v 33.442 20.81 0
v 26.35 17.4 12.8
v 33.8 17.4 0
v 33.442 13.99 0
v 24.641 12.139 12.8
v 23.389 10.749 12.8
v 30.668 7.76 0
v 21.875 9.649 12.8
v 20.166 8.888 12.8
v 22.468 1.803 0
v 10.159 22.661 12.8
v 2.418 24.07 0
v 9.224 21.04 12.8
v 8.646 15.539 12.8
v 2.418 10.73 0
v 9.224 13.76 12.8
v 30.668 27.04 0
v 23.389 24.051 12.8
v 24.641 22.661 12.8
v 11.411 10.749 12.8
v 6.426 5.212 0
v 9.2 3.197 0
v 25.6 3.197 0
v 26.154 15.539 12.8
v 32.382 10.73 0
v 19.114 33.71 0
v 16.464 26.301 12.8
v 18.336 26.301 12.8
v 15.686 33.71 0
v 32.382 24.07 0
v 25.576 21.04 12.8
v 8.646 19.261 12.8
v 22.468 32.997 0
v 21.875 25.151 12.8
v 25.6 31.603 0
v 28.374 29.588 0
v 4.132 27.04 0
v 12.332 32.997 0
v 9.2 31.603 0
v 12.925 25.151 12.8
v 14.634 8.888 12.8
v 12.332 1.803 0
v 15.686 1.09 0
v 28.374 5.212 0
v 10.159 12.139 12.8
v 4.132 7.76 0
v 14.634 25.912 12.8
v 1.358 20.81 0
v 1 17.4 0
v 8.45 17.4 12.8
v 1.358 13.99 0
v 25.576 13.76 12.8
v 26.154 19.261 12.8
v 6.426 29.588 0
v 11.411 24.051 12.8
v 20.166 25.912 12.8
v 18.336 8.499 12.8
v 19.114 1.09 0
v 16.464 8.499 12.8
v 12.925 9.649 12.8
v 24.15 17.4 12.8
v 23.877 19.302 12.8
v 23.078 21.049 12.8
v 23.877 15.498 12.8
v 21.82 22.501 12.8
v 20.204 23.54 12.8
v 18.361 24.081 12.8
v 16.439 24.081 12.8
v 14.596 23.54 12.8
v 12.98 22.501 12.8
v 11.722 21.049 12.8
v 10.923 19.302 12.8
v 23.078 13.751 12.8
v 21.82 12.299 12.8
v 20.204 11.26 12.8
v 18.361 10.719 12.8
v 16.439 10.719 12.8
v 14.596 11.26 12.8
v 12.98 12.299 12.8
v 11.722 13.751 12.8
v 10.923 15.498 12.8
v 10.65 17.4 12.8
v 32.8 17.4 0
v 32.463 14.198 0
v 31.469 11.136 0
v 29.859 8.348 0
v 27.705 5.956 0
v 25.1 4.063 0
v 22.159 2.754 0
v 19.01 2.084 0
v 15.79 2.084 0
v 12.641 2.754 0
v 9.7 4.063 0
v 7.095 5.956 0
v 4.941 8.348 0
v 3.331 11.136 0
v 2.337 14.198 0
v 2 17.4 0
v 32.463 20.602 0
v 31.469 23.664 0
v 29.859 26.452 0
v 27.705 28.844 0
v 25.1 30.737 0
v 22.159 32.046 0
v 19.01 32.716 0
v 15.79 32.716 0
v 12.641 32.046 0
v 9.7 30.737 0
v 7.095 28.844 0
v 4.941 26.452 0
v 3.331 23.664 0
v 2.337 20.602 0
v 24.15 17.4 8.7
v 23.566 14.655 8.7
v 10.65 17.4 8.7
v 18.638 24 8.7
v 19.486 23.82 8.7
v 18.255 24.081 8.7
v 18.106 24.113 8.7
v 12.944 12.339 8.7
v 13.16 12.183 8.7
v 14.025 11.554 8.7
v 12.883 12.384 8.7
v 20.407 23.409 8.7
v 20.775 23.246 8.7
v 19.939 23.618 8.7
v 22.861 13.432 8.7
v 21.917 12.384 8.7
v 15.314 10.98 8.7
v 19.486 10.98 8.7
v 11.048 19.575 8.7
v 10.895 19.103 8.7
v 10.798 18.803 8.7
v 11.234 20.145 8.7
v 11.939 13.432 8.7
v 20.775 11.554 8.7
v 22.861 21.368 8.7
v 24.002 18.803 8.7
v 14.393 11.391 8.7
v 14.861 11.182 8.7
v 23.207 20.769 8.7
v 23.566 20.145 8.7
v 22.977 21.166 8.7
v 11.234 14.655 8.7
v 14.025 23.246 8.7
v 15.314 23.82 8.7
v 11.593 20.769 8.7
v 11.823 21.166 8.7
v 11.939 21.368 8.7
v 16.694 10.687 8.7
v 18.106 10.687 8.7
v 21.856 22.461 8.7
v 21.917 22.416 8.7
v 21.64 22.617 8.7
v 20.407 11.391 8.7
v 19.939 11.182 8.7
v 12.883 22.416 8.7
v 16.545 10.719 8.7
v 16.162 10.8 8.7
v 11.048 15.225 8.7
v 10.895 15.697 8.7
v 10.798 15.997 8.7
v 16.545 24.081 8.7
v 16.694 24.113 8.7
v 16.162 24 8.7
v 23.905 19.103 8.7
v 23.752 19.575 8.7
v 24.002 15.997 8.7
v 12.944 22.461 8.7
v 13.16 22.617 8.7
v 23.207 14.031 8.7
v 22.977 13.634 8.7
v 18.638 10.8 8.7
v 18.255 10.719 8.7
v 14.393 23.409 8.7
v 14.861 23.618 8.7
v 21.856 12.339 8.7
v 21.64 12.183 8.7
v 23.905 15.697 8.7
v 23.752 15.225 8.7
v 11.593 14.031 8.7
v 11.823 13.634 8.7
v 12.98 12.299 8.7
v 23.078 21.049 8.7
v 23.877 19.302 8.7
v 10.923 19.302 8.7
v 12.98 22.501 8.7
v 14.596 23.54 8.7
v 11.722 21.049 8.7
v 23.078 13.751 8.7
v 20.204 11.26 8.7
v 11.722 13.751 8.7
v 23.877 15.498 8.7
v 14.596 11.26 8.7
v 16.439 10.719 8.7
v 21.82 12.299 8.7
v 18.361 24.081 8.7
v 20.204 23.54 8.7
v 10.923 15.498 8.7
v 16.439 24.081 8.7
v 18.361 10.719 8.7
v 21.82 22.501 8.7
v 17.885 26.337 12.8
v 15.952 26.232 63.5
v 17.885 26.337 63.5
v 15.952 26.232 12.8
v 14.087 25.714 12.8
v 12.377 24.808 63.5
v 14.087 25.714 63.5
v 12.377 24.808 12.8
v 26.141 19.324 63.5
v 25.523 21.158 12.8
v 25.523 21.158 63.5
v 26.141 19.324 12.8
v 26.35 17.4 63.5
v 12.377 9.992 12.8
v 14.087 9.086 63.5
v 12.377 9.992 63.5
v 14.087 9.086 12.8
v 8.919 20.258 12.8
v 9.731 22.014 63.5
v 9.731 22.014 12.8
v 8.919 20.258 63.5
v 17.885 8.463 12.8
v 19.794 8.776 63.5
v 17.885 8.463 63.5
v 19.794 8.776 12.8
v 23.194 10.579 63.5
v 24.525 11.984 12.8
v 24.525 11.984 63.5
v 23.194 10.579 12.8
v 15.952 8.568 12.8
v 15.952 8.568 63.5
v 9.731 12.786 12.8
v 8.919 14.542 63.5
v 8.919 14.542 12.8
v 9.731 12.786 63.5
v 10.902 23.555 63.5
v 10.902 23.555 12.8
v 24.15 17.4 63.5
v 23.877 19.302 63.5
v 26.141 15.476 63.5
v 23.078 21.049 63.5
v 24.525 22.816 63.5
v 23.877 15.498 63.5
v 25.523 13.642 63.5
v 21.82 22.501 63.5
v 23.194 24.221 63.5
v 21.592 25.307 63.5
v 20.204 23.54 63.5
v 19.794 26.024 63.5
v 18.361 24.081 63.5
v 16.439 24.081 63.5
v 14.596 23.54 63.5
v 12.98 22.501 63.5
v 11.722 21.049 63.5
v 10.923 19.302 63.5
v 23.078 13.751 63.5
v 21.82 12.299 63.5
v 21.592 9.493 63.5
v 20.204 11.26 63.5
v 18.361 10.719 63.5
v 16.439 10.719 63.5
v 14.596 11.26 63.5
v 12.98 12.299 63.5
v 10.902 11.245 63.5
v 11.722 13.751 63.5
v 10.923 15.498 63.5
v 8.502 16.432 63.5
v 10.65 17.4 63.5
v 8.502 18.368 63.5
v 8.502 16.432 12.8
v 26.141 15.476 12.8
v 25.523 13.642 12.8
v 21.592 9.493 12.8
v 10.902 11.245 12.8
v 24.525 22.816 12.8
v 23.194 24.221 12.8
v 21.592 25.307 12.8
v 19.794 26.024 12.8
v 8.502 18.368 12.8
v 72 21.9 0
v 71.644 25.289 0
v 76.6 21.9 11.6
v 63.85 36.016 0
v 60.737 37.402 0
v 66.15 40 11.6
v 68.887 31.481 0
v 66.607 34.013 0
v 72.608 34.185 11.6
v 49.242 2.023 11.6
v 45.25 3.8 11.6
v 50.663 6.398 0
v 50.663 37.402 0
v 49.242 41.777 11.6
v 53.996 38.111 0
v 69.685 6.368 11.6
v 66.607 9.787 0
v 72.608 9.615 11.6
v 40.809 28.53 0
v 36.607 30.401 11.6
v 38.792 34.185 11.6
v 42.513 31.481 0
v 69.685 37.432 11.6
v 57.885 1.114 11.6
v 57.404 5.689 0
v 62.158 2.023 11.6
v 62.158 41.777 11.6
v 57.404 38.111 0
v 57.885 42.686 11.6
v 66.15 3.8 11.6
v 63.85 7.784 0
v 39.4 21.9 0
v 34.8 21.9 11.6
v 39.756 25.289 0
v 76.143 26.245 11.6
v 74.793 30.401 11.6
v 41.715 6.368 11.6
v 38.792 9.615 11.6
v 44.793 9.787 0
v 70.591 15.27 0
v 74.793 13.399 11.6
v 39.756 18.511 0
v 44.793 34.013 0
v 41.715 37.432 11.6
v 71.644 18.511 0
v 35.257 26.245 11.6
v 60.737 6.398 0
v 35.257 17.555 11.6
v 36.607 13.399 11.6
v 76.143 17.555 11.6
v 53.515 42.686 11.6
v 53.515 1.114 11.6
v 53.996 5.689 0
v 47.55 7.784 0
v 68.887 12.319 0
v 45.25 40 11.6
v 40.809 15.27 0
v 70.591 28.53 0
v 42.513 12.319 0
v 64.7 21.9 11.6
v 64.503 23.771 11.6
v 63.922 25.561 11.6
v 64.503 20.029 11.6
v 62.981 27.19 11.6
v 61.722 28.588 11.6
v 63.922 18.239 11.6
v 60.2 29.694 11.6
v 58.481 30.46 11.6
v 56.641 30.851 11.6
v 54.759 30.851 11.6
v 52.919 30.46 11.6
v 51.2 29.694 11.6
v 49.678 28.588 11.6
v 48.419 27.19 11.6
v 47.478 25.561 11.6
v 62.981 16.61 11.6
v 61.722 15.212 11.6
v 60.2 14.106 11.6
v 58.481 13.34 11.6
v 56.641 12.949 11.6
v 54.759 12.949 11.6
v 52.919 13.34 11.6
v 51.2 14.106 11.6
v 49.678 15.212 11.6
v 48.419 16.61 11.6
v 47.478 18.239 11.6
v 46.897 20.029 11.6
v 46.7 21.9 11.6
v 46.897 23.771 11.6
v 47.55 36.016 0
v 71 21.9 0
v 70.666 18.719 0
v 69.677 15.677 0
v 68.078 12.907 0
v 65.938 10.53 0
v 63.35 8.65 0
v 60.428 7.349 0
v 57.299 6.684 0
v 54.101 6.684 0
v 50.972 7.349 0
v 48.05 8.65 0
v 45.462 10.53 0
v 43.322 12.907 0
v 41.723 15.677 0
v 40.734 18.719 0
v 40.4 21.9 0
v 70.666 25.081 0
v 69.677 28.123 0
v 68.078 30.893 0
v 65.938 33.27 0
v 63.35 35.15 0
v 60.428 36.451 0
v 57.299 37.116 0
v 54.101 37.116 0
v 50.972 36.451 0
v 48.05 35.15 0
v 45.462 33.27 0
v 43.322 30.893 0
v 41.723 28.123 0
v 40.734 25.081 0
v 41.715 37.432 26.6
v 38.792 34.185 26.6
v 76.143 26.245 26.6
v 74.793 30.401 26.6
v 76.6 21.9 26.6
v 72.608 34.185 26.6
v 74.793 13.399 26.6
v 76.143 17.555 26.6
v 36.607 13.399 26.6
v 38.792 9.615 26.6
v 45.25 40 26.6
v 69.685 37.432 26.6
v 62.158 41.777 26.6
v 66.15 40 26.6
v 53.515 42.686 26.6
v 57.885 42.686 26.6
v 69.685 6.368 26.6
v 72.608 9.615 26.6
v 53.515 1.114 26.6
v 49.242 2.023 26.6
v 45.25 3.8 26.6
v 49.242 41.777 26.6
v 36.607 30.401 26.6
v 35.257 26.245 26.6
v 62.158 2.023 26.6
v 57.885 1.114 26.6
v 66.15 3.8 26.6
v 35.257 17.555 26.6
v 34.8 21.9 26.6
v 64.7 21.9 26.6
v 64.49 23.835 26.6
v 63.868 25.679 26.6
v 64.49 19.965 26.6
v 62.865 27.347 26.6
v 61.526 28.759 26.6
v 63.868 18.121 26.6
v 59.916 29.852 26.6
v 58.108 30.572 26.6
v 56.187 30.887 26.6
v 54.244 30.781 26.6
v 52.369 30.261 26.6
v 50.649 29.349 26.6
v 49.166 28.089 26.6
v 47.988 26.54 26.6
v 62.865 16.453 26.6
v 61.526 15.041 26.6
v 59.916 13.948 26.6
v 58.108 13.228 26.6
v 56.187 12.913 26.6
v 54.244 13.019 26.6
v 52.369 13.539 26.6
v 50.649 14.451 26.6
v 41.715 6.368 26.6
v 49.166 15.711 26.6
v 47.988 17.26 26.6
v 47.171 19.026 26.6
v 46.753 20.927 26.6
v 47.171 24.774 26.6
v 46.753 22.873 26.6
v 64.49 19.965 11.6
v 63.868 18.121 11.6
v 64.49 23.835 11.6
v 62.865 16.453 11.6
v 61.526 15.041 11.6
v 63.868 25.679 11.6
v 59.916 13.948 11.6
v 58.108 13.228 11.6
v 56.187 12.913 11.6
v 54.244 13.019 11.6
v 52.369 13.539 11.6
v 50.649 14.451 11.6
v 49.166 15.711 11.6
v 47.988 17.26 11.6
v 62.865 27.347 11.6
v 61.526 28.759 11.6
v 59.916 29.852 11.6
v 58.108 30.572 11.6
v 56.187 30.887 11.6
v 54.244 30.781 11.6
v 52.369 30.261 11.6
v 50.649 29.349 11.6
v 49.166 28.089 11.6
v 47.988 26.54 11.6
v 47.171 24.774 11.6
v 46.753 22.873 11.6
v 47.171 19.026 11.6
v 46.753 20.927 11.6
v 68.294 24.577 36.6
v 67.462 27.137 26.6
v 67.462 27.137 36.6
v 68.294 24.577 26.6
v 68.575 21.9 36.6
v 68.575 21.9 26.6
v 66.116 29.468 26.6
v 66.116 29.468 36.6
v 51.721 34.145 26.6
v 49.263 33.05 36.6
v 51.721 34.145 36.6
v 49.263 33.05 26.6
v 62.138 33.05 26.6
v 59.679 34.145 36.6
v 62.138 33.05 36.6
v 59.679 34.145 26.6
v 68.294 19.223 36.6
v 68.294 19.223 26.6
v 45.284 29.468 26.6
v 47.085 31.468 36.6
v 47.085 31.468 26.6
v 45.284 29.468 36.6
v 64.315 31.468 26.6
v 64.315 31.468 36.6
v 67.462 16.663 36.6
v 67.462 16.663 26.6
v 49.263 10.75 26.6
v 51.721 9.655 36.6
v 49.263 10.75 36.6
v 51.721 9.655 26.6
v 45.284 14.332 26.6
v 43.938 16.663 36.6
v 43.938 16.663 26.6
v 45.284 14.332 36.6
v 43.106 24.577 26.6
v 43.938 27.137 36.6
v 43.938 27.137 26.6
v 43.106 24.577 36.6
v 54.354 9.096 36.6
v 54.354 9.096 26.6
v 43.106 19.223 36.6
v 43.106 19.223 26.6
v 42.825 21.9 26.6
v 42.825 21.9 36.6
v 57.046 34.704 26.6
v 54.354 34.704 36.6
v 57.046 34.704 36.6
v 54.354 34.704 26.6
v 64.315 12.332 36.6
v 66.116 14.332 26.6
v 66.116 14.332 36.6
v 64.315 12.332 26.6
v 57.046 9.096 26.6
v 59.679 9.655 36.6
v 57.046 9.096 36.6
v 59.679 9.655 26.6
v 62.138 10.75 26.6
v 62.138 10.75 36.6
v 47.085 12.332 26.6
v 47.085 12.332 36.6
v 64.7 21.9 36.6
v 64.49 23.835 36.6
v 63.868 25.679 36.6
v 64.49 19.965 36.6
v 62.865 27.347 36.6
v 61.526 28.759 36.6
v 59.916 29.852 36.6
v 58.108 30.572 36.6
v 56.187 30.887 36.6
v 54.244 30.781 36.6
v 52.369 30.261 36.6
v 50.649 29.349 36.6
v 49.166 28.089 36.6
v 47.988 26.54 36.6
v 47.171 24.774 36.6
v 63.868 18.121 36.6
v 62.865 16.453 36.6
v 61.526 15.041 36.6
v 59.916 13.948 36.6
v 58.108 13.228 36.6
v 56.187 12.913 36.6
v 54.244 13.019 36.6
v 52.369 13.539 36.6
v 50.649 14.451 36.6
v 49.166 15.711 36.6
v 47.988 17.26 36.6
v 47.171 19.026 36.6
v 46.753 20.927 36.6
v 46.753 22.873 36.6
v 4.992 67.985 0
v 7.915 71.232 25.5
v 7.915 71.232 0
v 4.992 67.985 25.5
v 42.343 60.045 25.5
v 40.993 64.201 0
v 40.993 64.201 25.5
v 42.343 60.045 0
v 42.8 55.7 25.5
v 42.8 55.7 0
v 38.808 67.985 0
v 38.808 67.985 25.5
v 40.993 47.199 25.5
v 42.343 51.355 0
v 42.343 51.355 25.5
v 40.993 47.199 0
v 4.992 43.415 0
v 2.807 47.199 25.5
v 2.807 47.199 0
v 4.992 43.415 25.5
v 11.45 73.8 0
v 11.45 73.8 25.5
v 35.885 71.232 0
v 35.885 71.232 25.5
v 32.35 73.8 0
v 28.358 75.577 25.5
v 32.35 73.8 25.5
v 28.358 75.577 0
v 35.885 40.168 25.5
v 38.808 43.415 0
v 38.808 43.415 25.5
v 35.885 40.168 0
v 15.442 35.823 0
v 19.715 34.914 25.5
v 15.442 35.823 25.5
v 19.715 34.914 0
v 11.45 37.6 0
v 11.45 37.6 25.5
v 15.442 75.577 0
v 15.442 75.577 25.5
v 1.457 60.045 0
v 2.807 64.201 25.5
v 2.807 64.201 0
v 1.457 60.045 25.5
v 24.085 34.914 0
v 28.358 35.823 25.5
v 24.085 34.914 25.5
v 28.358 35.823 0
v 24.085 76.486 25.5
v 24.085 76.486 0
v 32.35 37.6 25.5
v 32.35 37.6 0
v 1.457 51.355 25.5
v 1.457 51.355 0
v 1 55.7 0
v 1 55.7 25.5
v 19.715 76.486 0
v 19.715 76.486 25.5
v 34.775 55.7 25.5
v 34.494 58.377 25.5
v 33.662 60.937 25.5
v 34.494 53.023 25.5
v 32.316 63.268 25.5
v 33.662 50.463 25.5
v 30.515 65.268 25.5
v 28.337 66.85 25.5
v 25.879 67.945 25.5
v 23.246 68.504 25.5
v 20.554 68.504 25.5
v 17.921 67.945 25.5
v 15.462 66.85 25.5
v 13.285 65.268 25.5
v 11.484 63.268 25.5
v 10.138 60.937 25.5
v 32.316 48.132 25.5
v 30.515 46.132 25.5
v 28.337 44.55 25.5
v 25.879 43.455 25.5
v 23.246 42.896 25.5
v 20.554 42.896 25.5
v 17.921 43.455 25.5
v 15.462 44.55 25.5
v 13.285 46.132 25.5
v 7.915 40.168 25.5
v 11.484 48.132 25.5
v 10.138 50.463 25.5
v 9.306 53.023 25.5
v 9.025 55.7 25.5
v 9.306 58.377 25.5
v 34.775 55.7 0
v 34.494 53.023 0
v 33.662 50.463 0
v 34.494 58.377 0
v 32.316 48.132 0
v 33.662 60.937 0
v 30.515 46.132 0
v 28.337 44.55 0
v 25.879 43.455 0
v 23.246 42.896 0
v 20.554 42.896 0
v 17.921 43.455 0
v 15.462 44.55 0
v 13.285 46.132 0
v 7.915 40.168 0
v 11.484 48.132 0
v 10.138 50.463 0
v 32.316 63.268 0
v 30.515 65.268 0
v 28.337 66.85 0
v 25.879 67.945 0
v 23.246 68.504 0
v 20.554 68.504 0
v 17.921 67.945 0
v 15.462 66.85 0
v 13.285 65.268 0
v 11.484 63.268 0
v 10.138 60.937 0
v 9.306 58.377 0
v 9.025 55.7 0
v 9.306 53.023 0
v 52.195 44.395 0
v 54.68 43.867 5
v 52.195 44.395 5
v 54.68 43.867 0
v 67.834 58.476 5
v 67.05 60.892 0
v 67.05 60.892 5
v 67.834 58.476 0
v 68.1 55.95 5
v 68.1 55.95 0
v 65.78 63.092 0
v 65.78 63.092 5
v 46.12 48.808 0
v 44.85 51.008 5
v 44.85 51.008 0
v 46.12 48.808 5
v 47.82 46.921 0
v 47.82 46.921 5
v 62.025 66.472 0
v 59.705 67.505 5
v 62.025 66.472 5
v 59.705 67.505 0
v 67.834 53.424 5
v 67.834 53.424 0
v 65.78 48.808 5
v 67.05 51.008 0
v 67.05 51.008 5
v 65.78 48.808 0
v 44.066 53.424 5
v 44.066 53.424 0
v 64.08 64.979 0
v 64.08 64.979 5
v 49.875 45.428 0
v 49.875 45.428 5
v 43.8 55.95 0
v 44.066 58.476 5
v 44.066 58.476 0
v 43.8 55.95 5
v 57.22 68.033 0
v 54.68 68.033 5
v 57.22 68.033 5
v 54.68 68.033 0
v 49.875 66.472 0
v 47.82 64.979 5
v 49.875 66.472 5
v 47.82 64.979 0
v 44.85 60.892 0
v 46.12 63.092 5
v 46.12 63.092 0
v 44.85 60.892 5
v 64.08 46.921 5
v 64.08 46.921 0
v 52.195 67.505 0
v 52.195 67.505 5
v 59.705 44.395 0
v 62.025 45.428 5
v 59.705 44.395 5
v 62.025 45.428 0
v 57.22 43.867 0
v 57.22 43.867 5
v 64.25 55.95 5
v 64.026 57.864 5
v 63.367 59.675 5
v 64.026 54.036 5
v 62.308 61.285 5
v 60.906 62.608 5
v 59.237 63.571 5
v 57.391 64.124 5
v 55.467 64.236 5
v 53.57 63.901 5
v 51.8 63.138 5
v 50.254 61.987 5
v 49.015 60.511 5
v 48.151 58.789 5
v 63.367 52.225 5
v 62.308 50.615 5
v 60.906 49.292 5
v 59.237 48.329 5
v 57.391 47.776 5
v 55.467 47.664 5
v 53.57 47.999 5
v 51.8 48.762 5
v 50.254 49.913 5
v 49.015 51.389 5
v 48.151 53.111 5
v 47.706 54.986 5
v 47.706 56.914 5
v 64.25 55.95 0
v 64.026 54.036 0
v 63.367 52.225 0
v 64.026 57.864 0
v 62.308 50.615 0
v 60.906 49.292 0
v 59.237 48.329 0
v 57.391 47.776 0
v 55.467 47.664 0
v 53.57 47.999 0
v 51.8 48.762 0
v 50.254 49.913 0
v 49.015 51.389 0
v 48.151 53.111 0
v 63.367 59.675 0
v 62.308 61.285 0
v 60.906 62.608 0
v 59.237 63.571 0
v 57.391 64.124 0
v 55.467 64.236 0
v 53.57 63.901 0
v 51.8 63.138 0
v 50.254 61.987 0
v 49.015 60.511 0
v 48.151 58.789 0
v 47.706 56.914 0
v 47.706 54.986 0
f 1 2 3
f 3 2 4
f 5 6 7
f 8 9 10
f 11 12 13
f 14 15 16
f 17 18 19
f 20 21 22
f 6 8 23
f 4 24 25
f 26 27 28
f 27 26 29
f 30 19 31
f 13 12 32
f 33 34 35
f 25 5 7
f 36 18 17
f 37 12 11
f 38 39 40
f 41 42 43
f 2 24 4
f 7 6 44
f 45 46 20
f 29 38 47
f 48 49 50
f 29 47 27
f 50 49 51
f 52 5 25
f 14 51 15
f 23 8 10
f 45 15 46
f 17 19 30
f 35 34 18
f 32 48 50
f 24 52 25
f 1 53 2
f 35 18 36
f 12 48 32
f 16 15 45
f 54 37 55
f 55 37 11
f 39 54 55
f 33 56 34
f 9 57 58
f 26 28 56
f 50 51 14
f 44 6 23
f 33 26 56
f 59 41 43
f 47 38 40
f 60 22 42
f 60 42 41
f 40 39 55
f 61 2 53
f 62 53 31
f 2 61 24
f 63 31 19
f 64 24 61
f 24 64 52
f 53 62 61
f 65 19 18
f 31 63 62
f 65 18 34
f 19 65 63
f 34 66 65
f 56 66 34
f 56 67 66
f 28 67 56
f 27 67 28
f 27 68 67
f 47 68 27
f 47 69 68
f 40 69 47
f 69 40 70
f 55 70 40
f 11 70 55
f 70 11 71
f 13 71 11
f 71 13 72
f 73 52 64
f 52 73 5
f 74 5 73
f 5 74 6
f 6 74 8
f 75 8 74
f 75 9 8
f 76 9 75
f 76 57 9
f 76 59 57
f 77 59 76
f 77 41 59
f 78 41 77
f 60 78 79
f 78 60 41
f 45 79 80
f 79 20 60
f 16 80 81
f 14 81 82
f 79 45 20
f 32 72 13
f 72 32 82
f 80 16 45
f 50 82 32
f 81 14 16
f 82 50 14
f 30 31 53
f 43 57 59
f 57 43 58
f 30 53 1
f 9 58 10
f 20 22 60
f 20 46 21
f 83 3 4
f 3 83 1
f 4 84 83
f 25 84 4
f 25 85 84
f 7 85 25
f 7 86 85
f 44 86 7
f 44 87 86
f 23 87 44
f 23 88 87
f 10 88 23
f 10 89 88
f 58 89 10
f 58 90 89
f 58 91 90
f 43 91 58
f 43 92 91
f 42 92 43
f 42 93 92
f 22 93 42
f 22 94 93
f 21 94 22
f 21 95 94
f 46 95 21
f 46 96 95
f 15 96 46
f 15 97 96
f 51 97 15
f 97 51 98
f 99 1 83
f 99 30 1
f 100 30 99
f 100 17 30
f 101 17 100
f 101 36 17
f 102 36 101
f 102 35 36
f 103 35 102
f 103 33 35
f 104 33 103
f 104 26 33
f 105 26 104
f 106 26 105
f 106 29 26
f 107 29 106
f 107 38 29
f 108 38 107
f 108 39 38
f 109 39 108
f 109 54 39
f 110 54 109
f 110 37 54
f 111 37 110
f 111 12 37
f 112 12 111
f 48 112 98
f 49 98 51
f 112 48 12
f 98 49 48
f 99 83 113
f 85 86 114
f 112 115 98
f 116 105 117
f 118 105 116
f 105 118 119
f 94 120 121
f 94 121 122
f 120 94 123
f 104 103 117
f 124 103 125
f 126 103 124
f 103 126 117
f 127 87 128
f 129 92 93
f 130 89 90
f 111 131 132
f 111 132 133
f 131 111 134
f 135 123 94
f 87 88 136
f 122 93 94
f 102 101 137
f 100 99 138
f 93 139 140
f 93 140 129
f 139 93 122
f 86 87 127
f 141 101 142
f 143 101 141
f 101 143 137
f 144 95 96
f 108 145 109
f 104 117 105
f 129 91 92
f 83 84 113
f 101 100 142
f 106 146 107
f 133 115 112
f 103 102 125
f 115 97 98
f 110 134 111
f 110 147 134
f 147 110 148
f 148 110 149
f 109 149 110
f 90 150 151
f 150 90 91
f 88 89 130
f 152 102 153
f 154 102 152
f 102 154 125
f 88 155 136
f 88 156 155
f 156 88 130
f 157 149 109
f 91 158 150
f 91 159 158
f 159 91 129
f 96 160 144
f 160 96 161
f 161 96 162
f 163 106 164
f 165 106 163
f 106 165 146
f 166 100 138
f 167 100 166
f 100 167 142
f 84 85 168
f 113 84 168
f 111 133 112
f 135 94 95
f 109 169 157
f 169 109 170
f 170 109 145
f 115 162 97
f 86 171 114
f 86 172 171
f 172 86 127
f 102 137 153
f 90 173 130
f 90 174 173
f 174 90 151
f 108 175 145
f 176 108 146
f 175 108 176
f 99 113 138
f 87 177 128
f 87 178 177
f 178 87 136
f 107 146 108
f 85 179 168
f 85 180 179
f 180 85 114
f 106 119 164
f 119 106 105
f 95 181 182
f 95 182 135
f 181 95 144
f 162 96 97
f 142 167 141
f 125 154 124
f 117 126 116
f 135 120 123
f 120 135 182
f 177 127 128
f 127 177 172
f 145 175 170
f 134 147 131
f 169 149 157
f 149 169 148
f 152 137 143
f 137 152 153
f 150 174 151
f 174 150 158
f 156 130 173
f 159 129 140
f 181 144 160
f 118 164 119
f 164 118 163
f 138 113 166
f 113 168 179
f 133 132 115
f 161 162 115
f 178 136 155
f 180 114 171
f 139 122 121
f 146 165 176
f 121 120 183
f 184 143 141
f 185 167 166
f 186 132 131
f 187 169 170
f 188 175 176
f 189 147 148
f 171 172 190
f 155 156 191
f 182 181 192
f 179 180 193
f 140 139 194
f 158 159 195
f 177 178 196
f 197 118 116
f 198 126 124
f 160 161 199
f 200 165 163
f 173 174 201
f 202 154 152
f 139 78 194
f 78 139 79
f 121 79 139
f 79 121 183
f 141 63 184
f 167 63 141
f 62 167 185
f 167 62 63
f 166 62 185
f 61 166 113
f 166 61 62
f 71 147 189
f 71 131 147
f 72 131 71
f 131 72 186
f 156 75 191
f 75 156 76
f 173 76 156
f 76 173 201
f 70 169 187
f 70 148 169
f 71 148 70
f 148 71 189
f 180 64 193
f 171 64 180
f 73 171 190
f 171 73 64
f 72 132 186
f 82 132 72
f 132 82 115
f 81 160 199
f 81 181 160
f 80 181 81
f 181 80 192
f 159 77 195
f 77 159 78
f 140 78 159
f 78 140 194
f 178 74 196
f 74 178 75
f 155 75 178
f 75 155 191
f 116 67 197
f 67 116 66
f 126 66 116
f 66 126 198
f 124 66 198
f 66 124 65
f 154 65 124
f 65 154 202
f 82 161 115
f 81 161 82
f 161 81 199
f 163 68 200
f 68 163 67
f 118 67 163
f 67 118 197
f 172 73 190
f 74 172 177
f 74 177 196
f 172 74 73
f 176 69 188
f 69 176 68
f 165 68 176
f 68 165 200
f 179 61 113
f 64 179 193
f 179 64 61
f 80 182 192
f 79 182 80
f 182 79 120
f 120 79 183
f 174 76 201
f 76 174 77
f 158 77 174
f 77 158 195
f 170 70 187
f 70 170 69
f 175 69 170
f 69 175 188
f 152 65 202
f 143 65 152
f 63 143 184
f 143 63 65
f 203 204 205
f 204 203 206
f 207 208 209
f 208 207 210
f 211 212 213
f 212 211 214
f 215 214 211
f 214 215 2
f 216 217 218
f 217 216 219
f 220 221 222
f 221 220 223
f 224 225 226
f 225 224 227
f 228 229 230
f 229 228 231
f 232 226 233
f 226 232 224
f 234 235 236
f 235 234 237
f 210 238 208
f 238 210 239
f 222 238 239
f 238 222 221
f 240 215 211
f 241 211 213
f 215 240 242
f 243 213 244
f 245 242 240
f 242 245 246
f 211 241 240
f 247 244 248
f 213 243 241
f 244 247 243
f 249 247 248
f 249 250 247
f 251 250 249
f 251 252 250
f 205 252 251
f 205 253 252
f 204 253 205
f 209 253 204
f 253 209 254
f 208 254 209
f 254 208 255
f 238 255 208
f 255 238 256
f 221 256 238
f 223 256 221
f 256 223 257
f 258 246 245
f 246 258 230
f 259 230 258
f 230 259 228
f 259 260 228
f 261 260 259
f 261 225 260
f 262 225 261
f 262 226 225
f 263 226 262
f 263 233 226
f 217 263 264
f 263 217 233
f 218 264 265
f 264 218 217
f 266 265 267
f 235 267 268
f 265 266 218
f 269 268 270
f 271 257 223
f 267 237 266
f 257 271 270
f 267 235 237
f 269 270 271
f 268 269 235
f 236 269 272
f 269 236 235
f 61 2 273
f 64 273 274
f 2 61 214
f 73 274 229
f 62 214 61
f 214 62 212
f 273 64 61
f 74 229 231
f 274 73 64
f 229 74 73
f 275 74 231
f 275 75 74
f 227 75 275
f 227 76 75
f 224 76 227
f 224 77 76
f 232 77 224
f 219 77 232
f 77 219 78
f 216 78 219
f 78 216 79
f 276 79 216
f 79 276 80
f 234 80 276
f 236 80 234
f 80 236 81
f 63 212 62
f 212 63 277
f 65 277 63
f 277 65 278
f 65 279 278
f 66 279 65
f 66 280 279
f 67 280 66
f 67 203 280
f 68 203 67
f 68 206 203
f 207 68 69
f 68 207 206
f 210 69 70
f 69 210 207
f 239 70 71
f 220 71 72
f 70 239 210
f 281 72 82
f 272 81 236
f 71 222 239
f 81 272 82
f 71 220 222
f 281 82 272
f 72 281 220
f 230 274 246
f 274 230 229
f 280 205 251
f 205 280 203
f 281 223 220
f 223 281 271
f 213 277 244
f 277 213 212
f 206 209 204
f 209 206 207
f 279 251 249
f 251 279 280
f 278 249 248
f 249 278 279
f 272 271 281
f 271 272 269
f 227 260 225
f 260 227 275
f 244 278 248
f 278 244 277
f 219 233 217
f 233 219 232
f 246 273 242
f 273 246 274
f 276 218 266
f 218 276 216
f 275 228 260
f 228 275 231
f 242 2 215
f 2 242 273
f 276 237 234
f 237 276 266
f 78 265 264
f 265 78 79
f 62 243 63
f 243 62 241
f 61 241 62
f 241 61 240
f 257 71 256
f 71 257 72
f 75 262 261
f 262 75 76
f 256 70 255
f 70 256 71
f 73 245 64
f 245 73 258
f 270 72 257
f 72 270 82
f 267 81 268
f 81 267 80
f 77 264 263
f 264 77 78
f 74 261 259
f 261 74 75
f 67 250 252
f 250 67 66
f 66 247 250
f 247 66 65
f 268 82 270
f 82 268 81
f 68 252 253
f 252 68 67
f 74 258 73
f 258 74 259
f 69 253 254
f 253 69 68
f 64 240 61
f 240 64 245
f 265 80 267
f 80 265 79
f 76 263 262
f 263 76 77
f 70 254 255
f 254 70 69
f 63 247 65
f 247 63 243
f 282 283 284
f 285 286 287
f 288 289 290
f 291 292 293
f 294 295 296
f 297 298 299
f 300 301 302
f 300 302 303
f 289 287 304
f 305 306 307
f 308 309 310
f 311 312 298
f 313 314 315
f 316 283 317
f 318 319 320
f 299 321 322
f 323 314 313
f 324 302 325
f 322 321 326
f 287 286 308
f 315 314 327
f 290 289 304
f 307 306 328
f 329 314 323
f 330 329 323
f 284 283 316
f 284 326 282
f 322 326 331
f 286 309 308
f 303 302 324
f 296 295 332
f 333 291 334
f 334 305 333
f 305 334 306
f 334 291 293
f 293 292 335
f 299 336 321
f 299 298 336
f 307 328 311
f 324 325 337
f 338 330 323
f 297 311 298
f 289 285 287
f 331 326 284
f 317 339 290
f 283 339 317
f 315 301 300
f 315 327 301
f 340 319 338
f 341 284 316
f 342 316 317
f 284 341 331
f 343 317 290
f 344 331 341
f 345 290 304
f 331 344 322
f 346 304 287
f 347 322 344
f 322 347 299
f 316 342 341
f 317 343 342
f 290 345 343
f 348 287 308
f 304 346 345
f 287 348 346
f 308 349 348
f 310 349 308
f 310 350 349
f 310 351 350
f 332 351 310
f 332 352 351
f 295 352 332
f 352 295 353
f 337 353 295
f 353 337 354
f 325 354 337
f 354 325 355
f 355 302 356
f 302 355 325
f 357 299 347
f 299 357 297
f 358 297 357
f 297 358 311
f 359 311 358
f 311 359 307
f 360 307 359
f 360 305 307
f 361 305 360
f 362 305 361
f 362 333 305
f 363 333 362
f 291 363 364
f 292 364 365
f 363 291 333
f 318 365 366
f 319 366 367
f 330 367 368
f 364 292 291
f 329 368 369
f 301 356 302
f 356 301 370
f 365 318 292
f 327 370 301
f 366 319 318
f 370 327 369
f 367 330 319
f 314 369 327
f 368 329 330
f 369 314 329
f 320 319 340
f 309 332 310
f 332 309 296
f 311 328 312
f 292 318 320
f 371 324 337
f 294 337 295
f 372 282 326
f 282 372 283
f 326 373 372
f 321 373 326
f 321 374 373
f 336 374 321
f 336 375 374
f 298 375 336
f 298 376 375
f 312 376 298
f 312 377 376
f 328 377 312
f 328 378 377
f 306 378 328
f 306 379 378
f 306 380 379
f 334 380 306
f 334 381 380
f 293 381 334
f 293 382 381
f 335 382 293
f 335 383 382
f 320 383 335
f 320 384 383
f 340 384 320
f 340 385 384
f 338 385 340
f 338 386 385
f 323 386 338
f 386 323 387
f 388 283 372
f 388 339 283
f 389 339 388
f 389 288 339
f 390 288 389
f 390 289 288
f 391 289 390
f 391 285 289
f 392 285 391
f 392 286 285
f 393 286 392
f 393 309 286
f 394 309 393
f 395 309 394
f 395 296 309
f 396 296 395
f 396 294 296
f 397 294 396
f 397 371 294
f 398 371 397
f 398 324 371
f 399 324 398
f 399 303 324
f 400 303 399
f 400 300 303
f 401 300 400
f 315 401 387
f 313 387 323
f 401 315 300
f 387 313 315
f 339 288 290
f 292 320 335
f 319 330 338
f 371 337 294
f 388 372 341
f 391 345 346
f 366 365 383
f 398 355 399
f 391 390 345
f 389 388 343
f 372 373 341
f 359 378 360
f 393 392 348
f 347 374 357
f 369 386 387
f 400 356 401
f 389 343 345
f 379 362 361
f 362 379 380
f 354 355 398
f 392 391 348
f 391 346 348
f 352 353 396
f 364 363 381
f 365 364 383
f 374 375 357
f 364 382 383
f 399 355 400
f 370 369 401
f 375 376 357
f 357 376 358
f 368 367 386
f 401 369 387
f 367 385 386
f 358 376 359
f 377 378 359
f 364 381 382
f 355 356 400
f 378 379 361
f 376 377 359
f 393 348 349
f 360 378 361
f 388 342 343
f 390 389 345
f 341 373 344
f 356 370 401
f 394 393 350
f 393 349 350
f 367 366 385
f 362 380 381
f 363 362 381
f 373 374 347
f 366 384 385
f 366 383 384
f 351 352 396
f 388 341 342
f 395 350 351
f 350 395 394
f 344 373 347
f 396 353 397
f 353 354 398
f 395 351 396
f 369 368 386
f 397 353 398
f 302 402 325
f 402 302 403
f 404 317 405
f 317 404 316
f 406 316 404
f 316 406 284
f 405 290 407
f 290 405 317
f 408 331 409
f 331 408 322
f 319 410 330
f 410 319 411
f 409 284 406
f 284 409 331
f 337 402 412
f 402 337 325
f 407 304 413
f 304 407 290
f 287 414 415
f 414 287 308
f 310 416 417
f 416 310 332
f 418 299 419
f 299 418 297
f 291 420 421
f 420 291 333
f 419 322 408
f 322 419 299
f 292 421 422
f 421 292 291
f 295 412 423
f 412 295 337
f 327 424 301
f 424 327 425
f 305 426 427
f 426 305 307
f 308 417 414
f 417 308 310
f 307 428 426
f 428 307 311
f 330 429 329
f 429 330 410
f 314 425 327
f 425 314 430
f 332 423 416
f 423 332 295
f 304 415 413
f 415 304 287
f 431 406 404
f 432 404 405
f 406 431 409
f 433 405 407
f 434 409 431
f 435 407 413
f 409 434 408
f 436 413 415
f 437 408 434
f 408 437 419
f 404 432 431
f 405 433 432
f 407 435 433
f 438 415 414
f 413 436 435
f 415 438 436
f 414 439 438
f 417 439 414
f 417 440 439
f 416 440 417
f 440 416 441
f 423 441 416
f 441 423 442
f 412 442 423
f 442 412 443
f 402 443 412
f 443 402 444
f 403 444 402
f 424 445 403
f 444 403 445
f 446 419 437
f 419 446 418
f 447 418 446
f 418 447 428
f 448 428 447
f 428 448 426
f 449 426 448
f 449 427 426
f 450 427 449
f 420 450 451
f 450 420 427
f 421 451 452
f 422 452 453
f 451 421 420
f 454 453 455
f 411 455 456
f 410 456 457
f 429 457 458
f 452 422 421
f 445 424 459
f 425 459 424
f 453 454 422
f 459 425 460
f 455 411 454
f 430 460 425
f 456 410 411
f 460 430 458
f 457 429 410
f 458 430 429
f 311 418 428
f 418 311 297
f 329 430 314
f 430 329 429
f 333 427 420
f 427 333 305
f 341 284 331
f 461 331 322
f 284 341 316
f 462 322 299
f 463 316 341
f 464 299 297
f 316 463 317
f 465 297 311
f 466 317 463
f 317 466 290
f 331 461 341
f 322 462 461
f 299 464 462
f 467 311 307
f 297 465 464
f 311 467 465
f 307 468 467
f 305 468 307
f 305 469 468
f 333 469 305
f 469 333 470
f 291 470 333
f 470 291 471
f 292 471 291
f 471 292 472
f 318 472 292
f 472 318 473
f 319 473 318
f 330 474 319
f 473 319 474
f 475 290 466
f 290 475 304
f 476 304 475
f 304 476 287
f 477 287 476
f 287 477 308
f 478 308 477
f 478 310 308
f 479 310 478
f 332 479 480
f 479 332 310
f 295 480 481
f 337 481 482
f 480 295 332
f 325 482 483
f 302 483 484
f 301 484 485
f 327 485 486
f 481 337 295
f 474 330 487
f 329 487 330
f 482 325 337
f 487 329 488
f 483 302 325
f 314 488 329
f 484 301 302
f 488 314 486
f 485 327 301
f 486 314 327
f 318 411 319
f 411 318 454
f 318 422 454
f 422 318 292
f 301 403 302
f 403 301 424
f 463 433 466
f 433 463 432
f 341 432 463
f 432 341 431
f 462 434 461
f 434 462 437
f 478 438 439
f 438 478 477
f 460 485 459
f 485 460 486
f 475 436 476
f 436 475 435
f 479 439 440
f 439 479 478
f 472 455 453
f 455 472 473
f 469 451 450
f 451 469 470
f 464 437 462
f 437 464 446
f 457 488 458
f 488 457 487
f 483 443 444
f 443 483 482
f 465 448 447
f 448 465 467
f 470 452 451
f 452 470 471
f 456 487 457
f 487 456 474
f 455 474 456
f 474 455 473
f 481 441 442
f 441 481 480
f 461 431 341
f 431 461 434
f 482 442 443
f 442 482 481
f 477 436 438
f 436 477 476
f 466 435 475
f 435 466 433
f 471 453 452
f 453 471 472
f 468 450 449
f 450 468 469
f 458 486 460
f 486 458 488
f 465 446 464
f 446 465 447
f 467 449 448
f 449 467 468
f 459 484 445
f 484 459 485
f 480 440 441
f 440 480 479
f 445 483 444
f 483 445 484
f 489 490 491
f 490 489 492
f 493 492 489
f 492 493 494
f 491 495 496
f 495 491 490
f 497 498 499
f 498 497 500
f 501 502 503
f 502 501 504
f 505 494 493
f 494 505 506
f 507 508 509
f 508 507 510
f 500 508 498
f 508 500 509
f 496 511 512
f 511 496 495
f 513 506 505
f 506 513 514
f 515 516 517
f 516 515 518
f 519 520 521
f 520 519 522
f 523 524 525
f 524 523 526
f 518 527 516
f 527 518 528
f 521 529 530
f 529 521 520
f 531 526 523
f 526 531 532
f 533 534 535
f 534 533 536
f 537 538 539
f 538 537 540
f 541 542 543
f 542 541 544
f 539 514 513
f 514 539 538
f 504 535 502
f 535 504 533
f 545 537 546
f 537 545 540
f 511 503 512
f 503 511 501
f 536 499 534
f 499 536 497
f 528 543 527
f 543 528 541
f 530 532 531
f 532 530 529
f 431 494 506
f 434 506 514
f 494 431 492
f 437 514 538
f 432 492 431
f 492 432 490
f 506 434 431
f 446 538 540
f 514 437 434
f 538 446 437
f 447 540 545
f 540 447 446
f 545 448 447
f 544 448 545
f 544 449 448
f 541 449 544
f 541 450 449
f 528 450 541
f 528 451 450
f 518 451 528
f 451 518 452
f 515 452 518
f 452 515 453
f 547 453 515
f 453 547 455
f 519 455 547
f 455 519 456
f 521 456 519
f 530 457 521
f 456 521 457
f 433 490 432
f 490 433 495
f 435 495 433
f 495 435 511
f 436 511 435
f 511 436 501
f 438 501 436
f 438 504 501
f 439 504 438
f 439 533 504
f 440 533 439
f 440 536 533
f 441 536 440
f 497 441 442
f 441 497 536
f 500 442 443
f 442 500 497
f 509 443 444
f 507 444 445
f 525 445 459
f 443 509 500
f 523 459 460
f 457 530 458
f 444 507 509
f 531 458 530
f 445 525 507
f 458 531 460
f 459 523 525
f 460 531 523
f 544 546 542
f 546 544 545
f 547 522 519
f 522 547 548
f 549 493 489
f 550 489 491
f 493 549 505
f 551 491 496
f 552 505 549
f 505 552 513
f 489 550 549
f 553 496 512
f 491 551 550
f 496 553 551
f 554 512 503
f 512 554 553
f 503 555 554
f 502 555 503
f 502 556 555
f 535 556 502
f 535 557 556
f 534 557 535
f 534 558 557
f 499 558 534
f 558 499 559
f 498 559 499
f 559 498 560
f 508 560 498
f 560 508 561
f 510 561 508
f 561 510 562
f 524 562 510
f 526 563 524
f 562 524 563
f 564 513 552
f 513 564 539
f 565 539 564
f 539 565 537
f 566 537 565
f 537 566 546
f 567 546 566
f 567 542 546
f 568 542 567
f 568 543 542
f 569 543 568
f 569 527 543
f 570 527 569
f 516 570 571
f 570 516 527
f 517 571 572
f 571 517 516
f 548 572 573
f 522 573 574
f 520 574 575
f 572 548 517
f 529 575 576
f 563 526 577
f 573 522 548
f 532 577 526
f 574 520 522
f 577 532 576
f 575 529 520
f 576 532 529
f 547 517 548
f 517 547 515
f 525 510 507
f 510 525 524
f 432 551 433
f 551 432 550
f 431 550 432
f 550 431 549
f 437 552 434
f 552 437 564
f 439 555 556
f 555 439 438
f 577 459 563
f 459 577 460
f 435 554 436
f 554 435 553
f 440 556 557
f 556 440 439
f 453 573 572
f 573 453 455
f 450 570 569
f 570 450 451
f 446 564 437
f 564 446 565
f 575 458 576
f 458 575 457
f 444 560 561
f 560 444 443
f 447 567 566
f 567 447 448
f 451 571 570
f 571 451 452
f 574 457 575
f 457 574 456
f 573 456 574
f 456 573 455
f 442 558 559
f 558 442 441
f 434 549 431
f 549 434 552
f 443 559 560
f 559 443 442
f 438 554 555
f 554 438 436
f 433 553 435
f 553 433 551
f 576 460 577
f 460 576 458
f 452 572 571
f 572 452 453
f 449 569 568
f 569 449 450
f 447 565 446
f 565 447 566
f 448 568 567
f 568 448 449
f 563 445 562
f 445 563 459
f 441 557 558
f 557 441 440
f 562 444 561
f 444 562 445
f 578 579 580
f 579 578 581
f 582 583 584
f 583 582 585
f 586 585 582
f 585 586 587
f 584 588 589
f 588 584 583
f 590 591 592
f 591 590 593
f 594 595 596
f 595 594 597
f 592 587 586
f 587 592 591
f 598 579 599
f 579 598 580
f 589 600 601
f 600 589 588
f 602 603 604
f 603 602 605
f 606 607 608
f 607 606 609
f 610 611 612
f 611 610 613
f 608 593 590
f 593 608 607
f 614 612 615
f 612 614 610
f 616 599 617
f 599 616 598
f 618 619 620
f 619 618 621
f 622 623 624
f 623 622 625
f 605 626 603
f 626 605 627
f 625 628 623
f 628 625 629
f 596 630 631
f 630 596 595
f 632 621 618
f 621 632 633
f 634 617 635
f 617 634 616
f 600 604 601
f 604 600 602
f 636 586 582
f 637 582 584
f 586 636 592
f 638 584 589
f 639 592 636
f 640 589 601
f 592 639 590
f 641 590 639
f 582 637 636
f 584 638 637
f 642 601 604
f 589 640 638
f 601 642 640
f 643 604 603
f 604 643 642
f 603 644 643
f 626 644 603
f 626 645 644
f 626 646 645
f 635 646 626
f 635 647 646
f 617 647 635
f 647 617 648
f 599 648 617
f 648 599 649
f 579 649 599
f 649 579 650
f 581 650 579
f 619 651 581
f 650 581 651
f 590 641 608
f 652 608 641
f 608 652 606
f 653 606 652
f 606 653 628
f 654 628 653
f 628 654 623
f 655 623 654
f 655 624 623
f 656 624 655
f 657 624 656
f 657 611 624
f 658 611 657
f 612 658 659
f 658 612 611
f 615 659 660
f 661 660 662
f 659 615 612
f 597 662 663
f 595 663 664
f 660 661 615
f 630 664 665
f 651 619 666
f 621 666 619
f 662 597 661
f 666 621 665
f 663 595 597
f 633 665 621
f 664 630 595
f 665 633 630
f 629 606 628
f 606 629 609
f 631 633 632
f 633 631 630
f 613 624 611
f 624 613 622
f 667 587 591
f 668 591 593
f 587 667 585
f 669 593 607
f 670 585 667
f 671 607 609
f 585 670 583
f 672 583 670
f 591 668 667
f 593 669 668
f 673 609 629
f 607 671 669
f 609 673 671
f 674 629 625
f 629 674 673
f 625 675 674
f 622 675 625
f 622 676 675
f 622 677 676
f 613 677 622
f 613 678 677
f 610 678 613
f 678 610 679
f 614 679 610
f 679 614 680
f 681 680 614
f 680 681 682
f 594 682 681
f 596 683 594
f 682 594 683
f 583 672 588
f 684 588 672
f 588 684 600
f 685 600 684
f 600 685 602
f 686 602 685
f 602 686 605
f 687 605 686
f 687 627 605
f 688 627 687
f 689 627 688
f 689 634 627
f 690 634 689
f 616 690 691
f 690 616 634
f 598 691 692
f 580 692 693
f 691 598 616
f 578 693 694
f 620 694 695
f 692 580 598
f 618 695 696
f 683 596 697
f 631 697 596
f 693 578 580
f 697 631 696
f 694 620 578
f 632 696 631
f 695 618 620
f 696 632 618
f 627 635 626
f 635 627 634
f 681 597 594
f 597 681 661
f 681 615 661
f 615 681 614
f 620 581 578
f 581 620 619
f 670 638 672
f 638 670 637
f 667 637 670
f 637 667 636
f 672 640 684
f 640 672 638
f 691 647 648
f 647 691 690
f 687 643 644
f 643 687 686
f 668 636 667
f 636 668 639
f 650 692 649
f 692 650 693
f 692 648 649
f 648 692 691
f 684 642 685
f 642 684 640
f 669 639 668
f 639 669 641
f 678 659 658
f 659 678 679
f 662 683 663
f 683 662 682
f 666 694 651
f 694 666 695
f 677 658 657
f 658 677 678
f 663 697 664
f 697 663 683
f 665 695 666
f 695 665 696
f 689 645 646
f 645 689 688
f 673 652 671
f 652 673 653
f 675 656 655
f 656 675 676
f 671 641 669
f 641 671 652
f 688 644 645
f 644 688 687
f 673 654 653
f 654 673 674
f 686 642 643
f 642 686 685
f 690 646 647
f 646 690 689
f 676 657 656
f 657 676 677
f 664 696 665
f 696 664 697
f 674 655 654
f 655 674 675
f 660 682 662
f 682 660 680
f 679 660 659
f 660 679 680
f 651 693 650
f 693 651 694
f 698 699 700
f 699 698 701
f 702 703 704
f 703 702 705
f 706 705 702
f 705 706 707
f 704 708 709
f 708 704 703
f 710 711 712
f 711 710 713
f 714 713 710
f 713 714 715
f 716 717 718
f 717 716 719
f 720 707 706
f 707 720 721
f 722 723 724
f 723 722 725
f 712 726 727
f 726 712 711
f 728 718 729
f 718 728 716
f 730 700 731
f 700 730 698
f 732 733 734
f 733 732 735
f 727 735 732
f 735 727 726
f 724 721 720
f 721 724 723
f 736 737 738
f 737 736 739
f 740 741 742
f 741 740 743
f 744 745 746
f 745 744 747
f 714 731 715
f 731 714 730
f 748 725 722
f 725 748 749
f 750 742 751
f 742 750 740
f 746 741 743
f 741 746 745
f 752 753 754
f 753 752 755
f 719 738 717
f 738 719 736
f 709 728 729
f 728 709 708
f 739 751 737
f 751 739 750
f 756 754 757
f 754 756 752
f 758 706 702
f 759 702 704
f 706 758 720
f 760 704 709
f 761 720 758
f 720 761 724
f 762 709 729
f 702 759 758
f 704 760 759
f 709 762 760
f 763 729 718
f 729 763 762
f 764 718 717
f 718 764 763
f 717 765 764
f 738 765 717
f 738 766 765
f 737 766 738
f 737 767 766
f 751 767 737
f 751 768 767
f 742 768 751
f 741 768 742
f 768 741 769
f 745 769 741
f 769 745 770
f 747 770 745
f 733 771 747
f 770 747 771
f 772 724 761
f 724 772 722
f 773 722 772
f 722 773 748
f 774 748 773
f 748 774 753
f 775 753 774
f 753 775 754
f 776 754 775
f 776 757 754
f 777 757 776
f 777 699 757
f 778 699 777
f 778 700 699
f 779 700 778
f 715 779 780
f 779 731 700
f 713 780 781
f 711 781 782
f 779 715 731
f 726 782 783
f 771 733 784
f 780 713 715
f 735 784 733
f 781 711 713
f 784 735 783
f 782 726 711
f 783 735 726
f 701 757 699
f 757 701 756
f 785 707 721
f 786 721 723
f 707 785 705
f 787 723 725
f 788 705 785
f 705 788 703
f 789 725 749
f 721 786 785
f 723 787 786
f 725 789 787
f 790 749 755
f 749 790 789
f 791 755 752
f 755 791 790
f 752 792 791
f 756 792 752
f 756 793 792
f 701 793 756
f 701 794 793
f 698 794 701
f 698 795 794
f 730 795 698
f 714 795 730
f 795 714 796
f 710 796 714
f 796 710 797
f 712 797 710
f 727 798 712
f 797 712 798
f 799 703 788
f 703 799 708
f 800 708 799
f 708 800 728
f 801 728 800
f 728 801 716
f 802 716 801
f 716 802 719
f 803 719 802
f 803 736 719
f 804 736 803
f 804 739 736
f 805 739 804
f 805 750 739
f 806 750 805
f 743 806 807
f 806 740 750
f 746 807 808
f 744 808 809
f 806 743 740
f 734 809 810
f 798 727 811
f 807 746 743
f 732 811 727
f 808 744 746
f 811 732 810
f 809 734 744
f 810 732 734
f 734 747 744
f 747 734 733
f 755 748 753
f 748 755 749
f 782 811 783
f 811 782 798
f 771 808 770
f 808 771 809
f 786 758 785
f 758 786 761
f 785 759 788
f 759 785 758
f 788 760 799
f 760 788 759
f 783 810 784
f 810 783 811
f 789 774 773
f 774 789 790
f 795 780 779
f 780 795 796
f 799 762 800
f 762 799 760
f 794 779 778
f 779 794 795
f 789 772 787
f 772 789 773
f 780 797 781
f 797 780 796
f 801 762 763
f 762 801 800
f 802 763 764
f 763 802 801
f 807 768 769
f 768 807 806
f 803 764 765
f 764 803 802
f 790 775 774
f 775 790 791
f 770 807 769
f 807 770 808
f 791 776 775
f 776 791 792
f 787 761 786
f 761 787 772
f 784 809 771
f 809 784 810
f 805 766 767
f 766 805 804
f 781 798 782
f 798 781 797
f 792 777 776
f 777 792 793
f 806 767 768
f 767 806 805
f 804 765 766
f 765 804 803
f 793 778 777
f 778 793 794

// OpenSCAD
// Part 1, funnel

// diameter 32.8 (radius , place (x.y) such that there is 1mm margin
translate([17.4, 17.4, 0])
union() {
	difference() { 	
		cylinder(h = 12.8, r1 = 16.4, r2 = 8.95);		
		cylinder(h = 8.7, r1 = 15.4, r2 = 6.75);
		translate([0, 0, 8.7])
		cylinder(h = 7.5, r = 6.75);
	}
	translate([0, 0, 12.8])
	difference() { 
		cylinder(h = 50.7, r = 8.95);		
		cylinder(h = 50.7, r = 6.75);
	}
}


// Part 2, cap

// max radius 41.8, place (x.y) such that there is 1mm margin
// between all elements
translate([55.7, 21.9, 0])
union() {
//base
	difference() {
		cylinder(h = 11.6, r1 = 16.3, r2 = 20.9); // r1 = 32.6, r2 = 41.8
		cylinder(h = 11.6, r1 = 15.3, r2 = 9); // r1 = 30.6, r2 = 18
	}
	translate([0, 0, 11.6])
	difference() {
		cylinder(h = 15, r = 20.9);
		cylinder(h = 15, r = 9);
	}
	translate([0, 0, 26.6])
	difference() {
		cylinder(h = 10, r = 12.875);
		cylinder(h = 10, r = 9);
	}
}


// Part 3, ring 1

translate([21.9, 55.7, 0])
difference() {
	cylinder(h = 25.5, r = 20.9);
	cylinder(h = 25.5, r = 12.875);
}

// Part 4, ring 2

translate([55.95, 55.95, 0])
difference() {
	cylinder(h = 5, r = 12.15);
	cylinder(h = 5, r = 8.3);
}
